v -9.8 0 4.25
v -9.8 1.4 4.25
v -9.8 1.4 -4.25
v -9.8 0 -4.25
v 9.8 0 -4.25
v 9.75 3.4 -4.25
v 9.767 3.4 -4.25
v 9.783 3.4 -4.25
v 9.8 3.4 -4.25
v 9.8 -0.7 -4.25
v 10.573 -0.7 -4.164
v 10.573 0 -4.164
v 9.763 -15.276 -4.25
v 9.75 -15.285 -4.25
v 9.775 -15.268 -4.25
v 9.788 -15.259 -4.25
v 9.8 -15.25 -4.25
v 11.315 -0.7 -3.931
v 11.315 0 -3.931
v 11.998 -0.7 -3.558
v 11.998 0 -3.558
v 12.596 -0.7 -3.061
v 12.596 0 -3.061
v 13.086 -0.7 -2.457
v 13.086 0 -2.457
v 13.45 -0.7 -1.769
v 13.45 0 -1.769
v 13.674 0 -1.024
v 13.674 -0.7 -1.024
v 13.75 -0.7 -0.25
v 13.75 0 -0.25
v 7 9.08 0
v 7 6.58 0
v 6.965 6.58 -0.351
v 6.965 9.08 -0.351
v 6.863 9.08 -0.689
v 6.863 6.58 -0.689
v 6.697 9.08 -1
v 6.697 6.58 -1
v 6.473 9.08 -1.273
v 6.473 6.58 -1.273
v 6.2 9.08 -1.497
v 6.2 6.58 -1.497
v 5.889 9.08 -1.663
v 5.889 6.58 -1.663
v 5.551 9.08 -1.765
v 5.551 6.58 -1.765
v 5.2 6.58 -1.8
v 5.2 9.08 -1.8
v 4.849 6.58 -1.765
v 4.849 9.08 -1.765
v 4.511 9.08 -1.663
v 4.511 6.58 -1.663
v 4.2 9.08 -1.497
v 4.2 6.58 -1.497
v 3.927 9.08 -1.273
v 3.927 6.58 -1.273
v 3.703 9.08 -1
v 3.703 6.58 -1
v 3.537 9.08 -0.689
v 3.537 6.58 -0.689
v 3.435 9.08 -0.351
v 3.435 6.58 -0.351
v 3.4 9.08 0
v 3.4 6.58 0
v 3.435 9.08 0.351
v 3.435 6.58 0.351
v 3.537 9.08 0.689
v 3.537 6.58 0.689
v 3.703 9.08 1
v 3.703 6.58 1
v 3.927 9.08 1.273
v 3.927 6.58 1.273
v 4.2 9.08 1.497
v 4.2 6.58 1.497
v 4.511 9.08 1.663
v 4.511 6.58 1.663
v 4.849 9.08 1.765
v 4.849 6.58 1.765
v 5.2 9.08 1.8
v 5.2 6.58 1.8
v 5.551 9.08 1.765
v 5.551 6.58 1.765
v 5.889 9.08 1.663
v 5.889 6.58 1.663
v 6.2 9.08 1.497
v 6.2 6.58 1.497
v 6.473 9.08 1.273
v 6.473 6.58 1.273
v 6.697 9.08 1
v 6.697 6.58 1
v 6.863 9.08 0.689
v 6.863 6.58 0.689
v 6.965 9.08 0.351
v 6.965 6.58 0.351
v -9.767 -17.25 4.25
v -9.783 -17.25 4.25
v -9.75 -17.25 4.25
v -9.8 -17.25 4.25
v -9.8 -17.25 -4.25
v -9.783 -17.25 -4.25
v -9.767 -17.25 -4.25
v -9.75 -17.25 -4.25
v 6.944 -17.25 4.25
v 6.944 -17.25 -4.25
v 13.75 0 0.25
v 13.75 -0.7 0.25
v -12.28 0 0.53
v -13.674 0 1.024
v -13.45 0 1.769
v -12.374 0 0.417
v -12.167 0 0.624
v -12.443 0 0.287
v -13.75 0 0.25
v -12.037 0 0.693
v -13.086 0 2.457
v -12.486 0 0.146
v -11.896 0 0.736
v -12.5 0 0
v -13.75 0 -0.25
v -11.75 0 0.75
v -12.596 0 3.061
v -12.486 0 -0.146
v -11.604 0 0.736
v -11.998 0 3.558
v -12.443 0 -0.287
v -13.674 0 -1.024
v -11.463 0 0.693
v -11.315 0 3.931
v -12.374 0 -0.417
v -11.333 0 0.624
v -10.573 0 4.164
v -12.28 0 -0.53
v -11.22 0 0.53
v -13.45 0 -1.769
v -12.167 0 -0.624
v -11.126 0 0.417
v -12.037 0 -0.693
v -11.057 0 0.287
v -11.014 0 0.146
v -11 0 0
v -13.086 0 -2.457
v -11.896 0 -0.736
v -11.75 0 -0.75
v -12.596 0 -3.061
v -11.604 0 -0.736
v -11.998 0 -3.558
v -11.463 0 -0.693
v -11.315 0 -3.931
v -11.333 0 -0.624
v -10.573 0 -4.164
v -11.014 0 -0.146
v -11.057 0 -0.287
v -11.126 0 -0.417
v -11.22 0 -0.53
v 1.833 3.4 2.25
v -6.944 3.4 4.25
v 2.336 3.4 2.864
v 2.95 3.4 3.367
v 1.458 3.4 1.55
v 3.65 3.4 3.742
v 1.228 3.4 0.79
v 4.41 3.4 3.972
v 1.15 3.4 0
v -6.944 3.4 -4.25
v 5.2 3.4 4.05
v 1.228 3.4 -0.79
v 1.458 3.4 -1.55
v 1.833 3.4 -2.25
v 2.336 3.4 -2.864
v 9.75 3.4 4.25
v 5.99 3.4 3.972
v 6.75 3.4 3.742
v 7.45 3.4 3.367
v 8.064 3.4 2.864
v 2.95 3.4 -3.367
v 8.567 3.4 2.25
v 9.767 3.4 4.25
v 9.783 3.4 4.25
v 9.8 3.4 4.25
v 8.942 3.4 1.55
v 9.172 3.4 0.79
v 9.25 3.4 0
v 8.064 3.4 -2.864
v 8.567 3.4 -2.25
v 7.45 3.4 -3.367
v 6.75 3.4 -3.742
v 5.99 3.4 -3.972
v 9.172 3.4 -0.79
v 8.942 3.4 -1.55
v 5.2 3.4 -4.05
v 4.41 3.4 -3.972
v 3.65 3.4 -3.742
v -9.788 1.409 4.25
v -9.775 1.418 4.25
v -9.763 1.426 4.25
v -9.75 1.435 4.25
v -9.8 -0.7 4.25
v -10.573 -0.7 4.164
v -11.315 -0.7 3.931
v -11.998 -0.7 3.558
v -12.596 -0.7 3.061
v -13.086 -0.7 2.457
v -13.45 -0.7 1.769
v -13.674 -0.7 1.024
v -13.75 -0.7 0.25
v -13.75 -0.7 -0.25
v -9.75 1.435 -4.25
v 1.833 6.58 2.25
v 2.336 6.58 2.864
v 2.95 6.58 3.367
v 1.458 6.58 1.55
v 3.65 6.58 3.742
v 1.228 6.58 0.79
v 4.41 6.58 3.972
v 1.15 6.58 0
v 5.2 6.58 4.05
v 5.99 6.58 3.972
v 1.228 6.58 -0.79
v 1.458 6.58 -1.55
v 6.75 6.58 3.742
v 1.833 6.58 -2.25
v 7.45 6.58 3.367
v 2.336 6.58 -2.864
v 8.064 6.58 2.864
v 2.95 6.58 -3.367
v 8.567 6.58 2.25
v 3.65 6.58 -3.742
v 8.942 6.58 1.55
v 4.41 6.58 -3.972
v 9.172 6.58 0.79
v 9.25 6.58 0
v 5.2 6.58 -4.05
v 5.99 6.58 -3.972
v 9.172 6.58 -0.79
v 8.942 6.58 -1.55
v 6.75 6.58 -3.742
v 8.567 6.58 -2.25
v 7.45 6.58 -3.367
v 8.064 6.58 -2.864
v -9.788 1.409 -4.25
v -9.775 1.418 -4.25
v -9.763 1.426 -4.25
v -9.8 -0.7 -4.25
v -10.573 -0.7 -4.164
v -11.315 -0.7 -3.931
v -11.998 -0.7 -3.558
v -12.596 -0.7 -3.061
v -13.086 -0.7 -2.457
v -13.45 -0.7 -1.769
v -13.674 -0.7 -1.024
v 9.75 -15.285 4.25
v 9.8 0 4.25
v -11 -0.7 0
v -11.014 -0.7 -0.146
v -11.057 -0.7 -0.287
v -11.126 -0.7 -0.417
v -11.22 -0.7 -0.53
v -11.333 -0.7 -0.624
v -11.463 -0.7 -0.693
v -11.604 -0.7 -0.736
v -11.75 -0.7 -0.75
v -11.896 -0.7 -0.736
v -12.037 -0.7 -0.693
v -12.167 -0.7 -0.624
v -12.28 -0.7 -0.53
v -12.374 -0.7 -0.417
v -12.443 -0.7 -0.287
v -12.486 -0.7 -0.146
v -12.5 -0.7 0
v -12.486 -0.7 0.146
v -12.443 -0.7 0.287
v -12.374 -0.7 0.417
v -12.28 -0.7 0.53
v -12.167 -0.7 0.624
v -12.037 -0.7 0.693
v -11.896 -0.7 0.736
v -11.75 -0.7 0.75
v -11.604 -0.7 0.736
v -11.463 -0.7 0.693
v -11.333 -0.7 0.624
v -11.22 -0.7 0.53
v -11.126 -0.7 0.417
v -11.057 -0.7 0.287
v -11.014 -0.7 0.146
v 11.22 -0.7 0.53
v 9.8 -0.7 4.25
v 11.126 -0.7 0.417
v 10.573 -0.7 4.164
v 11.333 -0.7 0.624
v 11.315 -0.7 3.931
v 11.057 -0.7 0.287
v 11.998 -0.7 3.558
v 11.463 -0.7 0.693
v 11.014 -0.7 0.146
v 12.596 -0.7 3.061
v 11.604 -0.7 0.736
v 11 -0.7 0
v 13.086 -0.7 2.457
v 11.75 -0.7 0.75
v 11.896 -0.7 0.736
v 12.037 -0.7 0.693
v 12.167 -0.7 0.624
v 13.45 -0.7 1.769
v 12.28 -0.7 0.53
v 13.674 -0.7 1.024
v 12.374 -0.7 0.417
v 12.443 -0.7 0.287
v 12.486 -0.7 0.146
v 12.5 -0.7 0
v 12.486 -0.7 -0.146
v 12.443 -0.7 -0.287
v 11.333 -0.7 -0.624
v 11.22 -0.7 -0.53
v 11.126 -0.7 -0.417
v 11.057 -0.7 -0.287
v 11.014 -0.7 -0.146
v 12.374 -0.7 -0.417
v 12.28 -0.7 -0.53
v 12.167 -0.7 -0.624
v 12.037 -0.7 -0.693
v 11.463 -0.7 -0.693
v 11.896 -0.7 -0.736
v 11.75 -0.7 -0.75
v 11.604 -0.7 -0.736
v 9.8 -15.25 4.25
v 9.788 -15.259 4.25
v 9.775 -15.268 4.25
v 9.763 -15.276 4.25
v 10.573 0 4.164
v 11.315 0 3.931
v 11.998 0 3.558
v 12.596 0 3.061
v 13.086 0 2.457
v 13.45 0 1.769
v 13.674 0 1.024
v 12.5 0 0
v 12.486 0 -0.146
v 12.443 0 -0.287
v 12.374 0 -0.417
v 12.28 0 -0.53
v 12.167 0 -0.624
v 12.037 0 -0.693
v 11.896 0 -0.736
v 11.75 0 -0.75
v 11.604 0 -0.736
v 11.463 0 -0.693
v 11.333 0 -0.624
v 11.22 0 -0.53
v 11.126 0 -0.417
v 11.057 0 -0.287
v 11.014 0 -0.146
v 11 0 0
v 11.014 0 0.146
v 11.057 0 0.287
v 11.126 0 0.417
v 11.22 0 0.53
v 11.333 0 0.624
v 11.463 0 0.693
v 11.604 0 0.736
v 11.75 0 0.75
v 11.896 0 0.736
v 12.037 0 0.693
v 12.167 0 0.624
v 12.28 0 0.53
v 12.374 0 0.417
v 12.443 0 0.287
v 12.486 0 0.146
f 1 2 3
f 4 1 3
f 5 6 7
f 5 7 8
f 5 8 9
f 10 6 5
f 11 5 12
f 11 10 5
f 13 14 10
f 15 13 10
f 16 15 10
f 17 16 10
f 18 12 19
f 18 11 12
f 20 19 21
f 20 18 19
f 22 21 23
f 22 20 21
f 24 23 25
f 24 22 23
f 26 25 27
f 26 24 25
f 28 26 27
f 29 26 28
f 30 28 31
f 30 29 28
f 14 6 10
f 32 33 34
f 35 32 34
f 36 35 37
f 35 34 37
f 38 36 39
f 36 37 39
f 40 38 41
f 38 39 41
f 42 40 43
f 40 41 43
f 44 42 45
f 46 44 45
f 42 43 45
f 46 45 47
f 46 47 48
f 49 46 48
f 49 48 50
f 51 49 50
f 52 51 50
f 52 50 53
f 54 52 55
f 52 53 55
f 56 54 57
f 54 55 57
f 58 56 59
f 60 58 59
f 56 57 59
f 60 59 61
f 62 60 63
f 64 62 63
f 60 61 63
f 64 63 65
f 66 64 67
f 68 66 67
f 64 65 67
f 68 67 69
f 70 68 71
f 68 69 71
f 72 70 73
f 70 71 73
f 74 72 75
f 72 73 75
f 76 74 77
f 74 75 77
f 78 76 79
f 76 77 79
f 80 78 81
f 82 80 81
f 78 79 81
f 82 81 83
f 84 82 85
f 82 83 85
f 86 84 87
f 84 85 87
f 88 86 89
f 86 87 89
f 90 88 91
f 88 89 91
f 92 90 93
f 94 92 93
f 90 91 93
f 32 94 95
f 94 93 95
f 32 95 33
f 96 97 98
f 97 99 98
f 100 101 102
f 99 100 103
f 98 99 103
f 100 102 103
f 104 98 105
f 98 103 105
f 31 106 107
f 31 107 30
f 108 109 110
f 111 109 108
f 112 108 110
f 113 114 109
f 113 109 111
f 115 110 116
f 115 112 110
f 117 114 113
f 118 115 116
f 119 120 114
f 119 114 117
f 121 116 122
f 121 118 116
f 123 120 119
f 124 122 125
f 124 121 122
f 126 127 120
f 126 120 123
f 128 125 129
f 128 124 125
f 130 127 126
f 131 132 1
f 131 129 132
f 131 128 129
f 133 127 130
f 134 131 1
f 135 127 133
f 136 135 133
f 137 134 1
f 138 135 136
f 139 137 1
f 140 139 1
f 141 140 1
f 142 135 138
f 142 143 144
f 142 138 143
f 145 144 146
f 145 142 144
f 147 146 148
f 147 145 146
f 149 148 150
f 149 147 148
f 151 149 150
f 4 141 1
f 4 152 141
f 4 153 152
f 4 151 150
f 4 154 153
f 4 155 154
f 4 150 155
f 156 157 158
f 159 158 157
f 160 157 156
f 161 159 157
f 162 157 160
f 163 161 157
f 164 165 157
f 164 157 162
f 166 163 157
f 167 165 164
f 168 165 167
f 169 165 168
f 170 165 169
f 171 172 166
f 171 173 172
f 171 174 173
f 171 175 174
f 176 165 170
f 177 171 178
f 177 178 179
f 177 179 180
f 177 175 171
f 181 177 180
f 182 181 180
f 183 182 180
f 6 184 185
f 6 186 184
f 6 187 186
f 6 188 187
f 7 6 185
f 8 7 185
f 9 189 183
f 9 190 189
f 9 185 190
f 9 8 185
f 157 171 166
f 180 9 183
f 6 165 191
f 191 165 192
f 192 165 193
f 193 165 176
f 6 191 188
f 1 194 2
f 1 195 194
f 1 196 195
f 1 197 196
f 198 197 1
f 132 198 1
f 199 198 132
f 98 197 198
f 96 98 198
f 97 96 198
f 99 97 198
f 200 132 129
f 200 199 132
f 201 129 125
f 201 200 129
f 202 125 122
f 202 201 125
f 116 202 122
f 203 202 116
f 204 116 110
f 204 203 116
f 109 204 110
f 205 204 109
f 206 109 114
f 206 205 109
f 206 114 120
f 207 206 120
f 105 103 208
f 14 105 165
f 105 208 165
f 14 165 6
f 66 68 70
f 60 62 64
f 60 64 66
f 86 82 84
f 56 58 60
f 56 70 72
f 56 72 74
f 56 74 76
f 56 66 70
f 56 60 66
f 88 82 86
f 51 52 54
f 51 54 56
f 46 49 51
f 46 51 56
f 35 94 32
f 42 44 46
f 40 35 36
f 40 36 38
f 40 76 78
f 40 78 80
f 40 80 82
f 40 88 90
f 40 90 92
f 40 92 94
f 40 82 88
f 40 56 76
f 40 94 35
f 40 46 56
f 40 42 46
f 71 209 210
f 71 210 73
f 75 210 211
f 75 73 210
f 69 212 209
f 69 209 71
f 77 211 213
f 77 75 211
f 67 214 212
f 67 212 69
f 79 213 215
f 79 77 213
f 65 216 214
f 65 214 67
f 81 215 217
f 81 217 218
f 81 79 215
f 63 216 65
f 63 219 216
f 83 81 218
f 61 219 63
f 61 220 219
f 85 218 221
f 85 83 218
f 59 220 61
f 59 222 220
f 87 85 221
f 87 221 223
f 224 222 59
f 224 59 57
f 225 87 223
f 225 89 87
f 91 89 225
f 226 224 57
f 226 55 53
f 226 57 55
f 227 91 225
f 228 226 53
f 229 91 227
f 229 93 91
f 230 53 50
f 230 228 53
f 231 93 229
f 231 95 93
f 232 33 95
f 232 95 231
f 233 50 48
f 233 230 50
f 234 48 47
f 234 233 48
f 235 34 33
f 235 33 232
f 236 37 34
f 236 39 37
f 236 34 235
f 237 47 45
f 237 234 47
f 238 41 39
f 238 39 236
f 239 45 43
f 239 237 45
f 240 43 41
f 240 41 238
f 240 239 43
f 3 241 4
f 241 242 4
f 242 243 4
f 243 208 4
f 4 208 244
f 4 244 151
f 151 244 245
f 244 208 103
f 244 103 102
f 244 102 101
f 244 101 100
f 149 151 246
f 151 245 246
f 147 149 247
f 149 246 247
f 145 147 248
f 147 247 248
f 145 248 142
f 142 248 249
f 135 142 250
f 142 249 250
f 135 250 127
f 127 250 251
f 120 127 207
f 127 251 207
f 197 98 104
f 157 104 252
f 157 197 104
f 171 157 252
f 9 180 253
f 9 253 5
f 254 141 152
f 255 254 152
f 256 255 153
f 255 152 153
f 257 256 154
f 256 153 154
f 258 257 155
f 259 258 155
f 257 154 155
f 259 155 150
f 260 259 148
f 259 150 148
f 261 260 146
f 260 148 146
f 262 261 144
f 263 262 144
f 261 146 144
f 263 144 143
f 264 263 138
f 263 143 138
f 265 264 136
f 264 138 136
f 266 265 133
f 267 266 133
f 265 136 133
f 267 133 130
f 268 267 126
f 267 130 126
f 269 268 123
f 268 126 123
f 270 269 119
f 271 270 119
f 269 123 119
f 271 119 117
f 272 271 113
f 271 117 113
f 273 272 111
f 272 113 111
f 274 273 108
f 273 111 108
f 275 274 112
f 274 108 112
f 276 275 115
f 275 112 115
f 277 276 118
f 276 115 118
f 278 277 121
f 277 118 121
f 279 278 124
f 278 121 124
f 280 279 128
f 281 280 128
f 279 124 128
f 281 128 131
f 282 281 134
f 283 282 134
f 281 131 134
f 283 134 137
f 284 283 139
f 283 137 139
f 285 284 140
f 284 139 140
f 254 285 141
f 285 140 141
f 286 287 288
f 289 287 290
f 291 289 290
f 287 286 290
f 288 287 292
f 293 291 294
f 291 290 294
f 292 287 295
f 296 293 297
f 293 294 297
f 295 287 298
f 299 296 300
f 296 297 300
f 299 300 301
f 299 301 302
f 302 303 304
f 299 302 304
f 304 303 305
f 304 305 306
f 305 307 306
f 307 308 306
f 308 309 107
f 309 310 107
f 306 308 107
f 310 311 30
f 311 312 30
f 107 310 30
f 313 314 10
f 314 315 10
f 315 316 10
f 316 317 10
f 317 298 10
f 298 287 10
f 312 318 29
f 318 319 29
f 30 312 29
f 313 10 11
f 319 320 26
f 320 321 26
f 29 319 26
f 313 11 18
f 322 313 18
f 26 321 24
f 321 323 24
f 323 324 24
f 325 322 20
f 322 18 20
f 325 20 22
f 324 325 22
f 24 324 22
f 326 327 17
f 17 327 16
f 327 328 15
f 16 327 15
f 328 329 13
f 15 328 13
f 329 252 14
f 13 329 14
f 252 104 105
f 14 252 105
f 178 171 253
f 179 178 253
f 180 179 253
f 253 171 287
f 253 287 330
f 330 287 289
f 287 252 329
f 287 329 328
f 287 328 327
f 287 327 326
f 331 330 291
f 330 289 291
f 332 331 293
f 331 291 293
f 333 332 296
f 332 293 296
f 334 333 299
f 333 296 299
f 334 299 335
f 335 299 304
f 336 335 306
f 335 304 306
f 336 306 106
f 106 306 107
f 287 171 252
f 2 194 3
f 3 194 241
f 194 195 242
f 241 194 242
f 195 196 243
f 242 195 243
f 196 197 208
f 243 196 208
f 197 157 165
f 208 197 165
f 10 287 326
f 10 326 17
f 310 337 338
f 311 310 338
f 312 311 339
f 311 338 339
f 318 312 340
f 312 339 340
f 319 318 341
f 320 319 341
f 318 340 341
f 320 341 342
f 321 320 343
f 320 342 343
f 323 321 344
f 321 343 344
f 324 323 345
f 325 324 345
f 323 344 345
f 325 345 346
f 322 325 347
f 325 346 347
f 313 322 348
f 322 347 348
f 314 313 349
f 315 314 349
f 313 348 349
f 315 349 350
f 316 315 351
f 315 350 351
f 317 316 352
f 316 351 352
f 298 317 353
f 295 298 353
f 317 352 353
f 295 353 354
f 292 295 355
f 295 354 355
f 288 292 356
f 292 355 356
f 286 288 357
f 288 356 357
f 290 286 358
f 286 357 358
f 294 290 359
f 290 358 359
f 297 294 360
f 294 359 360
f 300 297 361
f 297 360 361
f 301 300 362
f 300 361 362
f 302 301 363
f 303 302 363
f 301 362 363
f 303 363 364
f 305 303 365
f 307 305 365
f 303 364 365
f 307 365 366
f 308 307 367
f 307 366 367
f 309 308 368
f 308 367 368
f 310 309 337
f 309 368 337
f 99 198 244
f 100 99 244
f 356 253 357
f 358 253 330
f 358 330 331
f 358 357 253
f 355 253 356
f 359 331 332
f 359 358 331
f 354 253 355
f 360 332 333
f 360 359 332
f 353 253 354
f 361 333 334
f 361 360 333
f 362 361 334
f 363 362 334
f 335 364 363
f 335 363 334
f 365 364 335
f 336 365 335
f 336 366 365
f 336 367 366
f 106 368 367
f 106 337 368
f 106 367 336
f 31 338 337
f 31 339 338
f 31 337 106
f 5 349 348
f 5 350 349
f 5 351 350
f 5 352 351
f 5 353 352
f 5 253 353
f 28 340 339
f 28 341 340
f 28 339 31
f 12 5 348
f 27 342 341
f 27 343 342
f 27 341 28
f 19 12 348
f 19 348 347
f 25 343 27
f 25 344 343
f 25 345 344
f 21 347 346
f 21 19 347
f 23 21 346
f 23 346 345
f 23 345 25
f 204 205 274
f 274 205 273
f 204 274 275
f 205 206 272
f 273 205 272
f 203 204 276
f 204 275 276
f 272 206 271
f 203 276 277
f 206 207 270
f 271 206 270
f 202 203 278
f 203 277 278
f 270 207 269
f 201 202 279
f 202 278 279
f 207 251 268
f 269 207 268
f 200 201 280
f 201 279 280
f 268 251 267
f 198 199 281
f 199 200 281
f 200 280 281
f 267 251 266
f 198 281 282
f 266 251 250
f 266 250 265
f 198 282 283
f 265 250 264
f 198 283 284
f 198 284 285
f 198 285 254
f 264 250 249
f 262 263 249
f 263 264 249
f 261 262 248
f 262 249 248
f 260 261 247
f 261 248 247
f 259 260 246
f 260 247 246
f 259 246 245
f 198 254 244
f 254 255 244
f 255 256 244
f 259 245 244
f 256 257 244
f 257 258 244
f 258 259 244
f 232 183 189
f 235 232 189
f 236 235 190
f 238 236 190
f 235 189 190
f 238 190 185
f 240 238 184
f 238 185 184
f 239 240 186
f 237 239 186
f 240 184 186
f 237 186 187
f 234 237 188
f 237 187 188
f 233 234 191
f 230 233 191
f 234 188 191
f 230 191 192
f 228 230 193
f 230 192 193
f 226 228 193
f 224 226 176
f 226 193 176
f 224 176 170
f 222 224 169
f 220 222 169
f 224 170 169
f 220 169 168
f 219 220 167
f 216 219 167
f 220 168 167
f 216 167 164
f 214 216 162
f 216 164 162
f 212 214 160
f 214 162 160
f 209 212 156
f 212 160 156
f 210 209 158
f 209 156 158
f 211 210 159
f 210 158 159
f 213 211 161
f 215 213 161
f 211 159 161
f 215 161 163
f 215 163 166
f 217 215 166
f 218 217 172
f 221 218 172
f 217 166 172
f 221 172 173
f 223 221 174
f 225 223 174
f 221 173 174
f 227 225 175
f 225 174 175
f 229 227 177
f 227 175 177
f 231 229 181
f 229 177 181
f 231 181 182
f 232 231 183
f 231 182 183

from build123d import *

# Parameters (mm, degrees)
SKETCH1_W                = 19.6
SKETCH1_H                = 8.5
BOSS_EXTRUDE1_DEPTH      = 3.4
BOSS_EXTRUDE1_DEPTH_BACK = 17.25
SKETCH2_R                = 4.05
BOSS_EXTRUDE2_DEPTH      = 3.18
SKETCH4_W                = 3.95
SKETCH4_H                = 8.5
SKETCH4_R                = 0.75
BOSS_EXTRUDE3_DEPTH      = 0.7
FILLET1_R                = 4
SKETCH5_R                = 1.8
BOSS_EXTRUDE4_DEPTH      = 2.5
CHAMFER1_SIZE            = 2
CHAMFER1_SIZE2           = 2.856296013
CHAMFER1_PART_2_SIZE     = 2
CHAMFER1_PART_2_SIZE2    = 2.856296013


with BuildPart() as part:
    # Sketch1 → Boss-Extrude1 (new body, two sides)
    with BuildSketch(Plane(origin=(0, 0, 0), x_dir=(1, 0, 0), z_dir=(0, 1, 0))) as boss_extrude1_sk:
        Rectangle(SKETCH1_W, SKETCH1_H)
    extrude(amount=BOSS_EXTRUDE1_DEPTH)
    extrude(boss_extrude1_sk.sketch, amount=-BOSS_EXTRUDE1_DEPTH_BACK)

    # Sketch2 → Boss-Extrude2 (add)
    with BuildSketch(Plane(origin=(0, 3.4, 0), x_dir=(1, 0, 0), z_dir=(0, 1, 0))):
        with Locations((5.2, 0)):
            Circle(SKETCH2_R)
    extrude(amount=BOSS_EXTRUDE2_DEPTH)

    # Sketch4 → Boss-Extrude3 (add)
    with BuildSketch(Plane(origin=(0, 0, 0), x_dir=(1, 0, 0), z_dir=(0, 1, 0))):
        with Locations((11.775, 0)):
            Rectangle(SKETCH4_W, SKETCH4_H)
        with Locations((11.75, 0)):
            Circle(SKETCH4_R, mode=Mode.SUBTRACT)
        with Locations((-11.775, 0)):
            Rectangle(SKETCH4_W, SKETCH4_H)
        with Locations((-11.75, 0)):
            Circle(SKETCH4_R, mode=Mode.SUBTRACT)
    extrude(amount=-BOSS_EXTRUDE3_DEPTH)

    # Fillet1
    fillet1_edges = [part.edges().sort_by_distance(p)[0] for p in [
        (13.75, -0.35, -4.25),
        (13.75, -0.35, 4.25),
        (-13.75, -0.35, -4.25),
        (-13.75, -0.35, 4.25),
    ]]
    fillet(fillet1_edges, radius=FILLET1_R)

    # Sketch5 → Boss-Extrude4 (add)
    with BuildSketch(Plane(origin=(0, 6.58, 0), x_dir=(1, 0, 0), z_dir=(0, 1, 0))):
        with Locations((5.2, 0)):
            Circle(SKETCH5_R)
    extrude(amount=BOSS_EXTRUDE4_DEPTH)

    # Chamfer1
    chamfer1_edges = [part.edges().sort_by_distance(p)[0] for p in [
        (9.8, -17.25, 0),
    ]]
    chamfer1_side = [part.faces().sort_by_distance(p)[0] for p in [
        (9.8, -8.975, 0),
    ]]
    chamfer(chamfer1_edges, length=CHAMFER1_SIZE, length2=CHAMFER1_SIZE2, reference=chamfer1_side[0])

    # Chamfer1 part 2
    chamfer1_part_2_edges = [part.edges().sort_by_distance(p)[0] for p in [
        (-9.8, 3.4, 0),
    ]]
    chamfer1_part_2_side = [part.faces().sort_by_distance(p)[0] for p in [
        (-9.8, 1.7, 0),
    ]]
    chamfer(chamfer1_part_2_edges, length=CHAMFER1_PART_2_SIZE, length2=CHAMFER1_PART_2_SIZE2, reference=chamfer1_part_2_side[0])


solid = part.part
